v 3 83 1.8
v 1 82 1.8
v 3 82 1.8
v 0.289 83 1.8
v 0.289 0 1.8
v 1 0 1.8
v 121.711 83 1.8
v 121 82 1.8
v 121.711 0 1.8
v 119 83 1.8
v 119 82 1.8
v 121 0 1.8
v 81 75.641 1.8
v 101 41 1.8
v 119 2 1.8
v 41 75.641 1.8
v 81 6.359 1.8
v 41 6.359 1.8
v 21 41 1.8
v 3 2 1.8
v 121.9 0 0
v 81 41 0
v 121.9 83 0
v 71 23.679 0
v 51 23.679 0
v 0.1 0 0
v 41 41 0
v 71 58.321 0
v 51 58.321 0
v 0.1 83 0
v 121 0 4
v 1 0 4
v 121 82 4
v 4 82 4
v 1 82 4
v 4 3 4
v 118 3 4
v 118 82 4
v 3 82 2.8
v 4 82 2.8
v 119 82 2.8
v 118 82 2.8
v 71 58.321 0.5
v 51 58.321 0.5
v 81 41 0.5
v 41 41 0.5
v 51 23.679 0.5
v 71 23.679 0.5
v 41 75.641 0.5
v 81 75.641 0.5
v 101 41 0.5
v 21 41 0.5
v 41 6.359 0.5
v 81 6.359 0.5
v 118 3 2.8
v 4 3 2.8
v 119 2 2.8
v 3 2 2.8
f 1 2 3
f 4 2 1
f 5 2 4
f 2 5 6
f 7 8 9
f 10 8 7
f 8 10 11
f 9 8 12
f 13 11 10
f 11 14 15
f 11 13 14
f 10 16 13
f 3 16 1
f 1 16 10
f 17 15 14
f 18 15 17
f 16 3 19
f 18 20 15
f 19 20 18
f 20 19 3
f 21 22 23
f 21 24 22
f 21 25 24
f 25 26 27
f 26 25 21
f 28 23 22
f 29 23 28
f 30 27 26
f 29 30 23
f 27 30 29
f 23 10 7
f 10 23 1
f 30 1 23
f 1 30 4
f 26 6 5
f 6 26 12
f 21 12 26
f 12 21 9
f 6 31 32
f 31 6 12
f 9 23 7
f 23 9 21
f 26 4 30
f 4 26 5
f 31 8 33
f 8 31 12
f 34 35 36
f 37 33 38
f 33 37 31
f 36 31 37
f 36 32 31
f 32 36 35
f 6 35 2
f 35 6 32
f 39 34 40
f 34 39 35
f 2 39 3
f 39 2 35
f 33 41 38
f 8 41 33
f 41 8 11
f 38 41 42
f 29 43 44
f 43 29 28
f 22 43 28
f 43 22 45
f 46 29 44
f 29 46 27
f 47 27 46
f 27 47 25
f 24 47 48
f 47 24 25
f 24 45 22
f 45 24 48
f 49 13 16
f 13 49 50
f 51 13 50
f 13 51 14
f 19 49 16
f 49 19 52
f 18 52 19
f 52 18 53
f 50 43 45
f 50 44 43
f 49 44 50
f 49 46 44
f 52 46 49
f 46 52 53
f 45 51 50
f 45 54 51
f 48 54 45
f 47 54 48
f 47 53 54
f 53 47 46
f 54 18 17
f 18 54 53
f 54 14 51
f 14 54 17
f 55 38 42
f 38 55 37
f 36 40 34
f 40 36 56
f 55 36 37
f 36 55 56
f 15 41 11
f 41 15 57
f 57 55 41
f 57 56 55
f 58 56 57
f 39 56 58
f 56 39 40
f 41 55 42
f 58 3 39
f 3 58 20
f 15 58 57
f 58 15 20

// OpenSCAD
difference() {
    union() {
        // the intersection is used to reduce the friction 
        // so it should be more easy to move this into 
        // faction try
        intersection() {
            cube([122,83,1.8]);
            rotate([-90,0,0]) {
                translate([61,0,0]) {
                    cylinder(85,60.9,60.9);
                }
            }
        }
        translate([1,0,1])
            cube([120,82,3]);
    }
    // home heaven hex
    translate([61,41,-1])
        cylinder(6, 20, 20, $fn=6);
    translate([61,41,0.5])
        cylinder(6, 40, 40, $fn=6);
    
    // space to move faction character card
    translate([4,3,1.8])
        cube([114,82,3]);
    translate([3,2,1.8])
        cube([116,83,1]);
}
